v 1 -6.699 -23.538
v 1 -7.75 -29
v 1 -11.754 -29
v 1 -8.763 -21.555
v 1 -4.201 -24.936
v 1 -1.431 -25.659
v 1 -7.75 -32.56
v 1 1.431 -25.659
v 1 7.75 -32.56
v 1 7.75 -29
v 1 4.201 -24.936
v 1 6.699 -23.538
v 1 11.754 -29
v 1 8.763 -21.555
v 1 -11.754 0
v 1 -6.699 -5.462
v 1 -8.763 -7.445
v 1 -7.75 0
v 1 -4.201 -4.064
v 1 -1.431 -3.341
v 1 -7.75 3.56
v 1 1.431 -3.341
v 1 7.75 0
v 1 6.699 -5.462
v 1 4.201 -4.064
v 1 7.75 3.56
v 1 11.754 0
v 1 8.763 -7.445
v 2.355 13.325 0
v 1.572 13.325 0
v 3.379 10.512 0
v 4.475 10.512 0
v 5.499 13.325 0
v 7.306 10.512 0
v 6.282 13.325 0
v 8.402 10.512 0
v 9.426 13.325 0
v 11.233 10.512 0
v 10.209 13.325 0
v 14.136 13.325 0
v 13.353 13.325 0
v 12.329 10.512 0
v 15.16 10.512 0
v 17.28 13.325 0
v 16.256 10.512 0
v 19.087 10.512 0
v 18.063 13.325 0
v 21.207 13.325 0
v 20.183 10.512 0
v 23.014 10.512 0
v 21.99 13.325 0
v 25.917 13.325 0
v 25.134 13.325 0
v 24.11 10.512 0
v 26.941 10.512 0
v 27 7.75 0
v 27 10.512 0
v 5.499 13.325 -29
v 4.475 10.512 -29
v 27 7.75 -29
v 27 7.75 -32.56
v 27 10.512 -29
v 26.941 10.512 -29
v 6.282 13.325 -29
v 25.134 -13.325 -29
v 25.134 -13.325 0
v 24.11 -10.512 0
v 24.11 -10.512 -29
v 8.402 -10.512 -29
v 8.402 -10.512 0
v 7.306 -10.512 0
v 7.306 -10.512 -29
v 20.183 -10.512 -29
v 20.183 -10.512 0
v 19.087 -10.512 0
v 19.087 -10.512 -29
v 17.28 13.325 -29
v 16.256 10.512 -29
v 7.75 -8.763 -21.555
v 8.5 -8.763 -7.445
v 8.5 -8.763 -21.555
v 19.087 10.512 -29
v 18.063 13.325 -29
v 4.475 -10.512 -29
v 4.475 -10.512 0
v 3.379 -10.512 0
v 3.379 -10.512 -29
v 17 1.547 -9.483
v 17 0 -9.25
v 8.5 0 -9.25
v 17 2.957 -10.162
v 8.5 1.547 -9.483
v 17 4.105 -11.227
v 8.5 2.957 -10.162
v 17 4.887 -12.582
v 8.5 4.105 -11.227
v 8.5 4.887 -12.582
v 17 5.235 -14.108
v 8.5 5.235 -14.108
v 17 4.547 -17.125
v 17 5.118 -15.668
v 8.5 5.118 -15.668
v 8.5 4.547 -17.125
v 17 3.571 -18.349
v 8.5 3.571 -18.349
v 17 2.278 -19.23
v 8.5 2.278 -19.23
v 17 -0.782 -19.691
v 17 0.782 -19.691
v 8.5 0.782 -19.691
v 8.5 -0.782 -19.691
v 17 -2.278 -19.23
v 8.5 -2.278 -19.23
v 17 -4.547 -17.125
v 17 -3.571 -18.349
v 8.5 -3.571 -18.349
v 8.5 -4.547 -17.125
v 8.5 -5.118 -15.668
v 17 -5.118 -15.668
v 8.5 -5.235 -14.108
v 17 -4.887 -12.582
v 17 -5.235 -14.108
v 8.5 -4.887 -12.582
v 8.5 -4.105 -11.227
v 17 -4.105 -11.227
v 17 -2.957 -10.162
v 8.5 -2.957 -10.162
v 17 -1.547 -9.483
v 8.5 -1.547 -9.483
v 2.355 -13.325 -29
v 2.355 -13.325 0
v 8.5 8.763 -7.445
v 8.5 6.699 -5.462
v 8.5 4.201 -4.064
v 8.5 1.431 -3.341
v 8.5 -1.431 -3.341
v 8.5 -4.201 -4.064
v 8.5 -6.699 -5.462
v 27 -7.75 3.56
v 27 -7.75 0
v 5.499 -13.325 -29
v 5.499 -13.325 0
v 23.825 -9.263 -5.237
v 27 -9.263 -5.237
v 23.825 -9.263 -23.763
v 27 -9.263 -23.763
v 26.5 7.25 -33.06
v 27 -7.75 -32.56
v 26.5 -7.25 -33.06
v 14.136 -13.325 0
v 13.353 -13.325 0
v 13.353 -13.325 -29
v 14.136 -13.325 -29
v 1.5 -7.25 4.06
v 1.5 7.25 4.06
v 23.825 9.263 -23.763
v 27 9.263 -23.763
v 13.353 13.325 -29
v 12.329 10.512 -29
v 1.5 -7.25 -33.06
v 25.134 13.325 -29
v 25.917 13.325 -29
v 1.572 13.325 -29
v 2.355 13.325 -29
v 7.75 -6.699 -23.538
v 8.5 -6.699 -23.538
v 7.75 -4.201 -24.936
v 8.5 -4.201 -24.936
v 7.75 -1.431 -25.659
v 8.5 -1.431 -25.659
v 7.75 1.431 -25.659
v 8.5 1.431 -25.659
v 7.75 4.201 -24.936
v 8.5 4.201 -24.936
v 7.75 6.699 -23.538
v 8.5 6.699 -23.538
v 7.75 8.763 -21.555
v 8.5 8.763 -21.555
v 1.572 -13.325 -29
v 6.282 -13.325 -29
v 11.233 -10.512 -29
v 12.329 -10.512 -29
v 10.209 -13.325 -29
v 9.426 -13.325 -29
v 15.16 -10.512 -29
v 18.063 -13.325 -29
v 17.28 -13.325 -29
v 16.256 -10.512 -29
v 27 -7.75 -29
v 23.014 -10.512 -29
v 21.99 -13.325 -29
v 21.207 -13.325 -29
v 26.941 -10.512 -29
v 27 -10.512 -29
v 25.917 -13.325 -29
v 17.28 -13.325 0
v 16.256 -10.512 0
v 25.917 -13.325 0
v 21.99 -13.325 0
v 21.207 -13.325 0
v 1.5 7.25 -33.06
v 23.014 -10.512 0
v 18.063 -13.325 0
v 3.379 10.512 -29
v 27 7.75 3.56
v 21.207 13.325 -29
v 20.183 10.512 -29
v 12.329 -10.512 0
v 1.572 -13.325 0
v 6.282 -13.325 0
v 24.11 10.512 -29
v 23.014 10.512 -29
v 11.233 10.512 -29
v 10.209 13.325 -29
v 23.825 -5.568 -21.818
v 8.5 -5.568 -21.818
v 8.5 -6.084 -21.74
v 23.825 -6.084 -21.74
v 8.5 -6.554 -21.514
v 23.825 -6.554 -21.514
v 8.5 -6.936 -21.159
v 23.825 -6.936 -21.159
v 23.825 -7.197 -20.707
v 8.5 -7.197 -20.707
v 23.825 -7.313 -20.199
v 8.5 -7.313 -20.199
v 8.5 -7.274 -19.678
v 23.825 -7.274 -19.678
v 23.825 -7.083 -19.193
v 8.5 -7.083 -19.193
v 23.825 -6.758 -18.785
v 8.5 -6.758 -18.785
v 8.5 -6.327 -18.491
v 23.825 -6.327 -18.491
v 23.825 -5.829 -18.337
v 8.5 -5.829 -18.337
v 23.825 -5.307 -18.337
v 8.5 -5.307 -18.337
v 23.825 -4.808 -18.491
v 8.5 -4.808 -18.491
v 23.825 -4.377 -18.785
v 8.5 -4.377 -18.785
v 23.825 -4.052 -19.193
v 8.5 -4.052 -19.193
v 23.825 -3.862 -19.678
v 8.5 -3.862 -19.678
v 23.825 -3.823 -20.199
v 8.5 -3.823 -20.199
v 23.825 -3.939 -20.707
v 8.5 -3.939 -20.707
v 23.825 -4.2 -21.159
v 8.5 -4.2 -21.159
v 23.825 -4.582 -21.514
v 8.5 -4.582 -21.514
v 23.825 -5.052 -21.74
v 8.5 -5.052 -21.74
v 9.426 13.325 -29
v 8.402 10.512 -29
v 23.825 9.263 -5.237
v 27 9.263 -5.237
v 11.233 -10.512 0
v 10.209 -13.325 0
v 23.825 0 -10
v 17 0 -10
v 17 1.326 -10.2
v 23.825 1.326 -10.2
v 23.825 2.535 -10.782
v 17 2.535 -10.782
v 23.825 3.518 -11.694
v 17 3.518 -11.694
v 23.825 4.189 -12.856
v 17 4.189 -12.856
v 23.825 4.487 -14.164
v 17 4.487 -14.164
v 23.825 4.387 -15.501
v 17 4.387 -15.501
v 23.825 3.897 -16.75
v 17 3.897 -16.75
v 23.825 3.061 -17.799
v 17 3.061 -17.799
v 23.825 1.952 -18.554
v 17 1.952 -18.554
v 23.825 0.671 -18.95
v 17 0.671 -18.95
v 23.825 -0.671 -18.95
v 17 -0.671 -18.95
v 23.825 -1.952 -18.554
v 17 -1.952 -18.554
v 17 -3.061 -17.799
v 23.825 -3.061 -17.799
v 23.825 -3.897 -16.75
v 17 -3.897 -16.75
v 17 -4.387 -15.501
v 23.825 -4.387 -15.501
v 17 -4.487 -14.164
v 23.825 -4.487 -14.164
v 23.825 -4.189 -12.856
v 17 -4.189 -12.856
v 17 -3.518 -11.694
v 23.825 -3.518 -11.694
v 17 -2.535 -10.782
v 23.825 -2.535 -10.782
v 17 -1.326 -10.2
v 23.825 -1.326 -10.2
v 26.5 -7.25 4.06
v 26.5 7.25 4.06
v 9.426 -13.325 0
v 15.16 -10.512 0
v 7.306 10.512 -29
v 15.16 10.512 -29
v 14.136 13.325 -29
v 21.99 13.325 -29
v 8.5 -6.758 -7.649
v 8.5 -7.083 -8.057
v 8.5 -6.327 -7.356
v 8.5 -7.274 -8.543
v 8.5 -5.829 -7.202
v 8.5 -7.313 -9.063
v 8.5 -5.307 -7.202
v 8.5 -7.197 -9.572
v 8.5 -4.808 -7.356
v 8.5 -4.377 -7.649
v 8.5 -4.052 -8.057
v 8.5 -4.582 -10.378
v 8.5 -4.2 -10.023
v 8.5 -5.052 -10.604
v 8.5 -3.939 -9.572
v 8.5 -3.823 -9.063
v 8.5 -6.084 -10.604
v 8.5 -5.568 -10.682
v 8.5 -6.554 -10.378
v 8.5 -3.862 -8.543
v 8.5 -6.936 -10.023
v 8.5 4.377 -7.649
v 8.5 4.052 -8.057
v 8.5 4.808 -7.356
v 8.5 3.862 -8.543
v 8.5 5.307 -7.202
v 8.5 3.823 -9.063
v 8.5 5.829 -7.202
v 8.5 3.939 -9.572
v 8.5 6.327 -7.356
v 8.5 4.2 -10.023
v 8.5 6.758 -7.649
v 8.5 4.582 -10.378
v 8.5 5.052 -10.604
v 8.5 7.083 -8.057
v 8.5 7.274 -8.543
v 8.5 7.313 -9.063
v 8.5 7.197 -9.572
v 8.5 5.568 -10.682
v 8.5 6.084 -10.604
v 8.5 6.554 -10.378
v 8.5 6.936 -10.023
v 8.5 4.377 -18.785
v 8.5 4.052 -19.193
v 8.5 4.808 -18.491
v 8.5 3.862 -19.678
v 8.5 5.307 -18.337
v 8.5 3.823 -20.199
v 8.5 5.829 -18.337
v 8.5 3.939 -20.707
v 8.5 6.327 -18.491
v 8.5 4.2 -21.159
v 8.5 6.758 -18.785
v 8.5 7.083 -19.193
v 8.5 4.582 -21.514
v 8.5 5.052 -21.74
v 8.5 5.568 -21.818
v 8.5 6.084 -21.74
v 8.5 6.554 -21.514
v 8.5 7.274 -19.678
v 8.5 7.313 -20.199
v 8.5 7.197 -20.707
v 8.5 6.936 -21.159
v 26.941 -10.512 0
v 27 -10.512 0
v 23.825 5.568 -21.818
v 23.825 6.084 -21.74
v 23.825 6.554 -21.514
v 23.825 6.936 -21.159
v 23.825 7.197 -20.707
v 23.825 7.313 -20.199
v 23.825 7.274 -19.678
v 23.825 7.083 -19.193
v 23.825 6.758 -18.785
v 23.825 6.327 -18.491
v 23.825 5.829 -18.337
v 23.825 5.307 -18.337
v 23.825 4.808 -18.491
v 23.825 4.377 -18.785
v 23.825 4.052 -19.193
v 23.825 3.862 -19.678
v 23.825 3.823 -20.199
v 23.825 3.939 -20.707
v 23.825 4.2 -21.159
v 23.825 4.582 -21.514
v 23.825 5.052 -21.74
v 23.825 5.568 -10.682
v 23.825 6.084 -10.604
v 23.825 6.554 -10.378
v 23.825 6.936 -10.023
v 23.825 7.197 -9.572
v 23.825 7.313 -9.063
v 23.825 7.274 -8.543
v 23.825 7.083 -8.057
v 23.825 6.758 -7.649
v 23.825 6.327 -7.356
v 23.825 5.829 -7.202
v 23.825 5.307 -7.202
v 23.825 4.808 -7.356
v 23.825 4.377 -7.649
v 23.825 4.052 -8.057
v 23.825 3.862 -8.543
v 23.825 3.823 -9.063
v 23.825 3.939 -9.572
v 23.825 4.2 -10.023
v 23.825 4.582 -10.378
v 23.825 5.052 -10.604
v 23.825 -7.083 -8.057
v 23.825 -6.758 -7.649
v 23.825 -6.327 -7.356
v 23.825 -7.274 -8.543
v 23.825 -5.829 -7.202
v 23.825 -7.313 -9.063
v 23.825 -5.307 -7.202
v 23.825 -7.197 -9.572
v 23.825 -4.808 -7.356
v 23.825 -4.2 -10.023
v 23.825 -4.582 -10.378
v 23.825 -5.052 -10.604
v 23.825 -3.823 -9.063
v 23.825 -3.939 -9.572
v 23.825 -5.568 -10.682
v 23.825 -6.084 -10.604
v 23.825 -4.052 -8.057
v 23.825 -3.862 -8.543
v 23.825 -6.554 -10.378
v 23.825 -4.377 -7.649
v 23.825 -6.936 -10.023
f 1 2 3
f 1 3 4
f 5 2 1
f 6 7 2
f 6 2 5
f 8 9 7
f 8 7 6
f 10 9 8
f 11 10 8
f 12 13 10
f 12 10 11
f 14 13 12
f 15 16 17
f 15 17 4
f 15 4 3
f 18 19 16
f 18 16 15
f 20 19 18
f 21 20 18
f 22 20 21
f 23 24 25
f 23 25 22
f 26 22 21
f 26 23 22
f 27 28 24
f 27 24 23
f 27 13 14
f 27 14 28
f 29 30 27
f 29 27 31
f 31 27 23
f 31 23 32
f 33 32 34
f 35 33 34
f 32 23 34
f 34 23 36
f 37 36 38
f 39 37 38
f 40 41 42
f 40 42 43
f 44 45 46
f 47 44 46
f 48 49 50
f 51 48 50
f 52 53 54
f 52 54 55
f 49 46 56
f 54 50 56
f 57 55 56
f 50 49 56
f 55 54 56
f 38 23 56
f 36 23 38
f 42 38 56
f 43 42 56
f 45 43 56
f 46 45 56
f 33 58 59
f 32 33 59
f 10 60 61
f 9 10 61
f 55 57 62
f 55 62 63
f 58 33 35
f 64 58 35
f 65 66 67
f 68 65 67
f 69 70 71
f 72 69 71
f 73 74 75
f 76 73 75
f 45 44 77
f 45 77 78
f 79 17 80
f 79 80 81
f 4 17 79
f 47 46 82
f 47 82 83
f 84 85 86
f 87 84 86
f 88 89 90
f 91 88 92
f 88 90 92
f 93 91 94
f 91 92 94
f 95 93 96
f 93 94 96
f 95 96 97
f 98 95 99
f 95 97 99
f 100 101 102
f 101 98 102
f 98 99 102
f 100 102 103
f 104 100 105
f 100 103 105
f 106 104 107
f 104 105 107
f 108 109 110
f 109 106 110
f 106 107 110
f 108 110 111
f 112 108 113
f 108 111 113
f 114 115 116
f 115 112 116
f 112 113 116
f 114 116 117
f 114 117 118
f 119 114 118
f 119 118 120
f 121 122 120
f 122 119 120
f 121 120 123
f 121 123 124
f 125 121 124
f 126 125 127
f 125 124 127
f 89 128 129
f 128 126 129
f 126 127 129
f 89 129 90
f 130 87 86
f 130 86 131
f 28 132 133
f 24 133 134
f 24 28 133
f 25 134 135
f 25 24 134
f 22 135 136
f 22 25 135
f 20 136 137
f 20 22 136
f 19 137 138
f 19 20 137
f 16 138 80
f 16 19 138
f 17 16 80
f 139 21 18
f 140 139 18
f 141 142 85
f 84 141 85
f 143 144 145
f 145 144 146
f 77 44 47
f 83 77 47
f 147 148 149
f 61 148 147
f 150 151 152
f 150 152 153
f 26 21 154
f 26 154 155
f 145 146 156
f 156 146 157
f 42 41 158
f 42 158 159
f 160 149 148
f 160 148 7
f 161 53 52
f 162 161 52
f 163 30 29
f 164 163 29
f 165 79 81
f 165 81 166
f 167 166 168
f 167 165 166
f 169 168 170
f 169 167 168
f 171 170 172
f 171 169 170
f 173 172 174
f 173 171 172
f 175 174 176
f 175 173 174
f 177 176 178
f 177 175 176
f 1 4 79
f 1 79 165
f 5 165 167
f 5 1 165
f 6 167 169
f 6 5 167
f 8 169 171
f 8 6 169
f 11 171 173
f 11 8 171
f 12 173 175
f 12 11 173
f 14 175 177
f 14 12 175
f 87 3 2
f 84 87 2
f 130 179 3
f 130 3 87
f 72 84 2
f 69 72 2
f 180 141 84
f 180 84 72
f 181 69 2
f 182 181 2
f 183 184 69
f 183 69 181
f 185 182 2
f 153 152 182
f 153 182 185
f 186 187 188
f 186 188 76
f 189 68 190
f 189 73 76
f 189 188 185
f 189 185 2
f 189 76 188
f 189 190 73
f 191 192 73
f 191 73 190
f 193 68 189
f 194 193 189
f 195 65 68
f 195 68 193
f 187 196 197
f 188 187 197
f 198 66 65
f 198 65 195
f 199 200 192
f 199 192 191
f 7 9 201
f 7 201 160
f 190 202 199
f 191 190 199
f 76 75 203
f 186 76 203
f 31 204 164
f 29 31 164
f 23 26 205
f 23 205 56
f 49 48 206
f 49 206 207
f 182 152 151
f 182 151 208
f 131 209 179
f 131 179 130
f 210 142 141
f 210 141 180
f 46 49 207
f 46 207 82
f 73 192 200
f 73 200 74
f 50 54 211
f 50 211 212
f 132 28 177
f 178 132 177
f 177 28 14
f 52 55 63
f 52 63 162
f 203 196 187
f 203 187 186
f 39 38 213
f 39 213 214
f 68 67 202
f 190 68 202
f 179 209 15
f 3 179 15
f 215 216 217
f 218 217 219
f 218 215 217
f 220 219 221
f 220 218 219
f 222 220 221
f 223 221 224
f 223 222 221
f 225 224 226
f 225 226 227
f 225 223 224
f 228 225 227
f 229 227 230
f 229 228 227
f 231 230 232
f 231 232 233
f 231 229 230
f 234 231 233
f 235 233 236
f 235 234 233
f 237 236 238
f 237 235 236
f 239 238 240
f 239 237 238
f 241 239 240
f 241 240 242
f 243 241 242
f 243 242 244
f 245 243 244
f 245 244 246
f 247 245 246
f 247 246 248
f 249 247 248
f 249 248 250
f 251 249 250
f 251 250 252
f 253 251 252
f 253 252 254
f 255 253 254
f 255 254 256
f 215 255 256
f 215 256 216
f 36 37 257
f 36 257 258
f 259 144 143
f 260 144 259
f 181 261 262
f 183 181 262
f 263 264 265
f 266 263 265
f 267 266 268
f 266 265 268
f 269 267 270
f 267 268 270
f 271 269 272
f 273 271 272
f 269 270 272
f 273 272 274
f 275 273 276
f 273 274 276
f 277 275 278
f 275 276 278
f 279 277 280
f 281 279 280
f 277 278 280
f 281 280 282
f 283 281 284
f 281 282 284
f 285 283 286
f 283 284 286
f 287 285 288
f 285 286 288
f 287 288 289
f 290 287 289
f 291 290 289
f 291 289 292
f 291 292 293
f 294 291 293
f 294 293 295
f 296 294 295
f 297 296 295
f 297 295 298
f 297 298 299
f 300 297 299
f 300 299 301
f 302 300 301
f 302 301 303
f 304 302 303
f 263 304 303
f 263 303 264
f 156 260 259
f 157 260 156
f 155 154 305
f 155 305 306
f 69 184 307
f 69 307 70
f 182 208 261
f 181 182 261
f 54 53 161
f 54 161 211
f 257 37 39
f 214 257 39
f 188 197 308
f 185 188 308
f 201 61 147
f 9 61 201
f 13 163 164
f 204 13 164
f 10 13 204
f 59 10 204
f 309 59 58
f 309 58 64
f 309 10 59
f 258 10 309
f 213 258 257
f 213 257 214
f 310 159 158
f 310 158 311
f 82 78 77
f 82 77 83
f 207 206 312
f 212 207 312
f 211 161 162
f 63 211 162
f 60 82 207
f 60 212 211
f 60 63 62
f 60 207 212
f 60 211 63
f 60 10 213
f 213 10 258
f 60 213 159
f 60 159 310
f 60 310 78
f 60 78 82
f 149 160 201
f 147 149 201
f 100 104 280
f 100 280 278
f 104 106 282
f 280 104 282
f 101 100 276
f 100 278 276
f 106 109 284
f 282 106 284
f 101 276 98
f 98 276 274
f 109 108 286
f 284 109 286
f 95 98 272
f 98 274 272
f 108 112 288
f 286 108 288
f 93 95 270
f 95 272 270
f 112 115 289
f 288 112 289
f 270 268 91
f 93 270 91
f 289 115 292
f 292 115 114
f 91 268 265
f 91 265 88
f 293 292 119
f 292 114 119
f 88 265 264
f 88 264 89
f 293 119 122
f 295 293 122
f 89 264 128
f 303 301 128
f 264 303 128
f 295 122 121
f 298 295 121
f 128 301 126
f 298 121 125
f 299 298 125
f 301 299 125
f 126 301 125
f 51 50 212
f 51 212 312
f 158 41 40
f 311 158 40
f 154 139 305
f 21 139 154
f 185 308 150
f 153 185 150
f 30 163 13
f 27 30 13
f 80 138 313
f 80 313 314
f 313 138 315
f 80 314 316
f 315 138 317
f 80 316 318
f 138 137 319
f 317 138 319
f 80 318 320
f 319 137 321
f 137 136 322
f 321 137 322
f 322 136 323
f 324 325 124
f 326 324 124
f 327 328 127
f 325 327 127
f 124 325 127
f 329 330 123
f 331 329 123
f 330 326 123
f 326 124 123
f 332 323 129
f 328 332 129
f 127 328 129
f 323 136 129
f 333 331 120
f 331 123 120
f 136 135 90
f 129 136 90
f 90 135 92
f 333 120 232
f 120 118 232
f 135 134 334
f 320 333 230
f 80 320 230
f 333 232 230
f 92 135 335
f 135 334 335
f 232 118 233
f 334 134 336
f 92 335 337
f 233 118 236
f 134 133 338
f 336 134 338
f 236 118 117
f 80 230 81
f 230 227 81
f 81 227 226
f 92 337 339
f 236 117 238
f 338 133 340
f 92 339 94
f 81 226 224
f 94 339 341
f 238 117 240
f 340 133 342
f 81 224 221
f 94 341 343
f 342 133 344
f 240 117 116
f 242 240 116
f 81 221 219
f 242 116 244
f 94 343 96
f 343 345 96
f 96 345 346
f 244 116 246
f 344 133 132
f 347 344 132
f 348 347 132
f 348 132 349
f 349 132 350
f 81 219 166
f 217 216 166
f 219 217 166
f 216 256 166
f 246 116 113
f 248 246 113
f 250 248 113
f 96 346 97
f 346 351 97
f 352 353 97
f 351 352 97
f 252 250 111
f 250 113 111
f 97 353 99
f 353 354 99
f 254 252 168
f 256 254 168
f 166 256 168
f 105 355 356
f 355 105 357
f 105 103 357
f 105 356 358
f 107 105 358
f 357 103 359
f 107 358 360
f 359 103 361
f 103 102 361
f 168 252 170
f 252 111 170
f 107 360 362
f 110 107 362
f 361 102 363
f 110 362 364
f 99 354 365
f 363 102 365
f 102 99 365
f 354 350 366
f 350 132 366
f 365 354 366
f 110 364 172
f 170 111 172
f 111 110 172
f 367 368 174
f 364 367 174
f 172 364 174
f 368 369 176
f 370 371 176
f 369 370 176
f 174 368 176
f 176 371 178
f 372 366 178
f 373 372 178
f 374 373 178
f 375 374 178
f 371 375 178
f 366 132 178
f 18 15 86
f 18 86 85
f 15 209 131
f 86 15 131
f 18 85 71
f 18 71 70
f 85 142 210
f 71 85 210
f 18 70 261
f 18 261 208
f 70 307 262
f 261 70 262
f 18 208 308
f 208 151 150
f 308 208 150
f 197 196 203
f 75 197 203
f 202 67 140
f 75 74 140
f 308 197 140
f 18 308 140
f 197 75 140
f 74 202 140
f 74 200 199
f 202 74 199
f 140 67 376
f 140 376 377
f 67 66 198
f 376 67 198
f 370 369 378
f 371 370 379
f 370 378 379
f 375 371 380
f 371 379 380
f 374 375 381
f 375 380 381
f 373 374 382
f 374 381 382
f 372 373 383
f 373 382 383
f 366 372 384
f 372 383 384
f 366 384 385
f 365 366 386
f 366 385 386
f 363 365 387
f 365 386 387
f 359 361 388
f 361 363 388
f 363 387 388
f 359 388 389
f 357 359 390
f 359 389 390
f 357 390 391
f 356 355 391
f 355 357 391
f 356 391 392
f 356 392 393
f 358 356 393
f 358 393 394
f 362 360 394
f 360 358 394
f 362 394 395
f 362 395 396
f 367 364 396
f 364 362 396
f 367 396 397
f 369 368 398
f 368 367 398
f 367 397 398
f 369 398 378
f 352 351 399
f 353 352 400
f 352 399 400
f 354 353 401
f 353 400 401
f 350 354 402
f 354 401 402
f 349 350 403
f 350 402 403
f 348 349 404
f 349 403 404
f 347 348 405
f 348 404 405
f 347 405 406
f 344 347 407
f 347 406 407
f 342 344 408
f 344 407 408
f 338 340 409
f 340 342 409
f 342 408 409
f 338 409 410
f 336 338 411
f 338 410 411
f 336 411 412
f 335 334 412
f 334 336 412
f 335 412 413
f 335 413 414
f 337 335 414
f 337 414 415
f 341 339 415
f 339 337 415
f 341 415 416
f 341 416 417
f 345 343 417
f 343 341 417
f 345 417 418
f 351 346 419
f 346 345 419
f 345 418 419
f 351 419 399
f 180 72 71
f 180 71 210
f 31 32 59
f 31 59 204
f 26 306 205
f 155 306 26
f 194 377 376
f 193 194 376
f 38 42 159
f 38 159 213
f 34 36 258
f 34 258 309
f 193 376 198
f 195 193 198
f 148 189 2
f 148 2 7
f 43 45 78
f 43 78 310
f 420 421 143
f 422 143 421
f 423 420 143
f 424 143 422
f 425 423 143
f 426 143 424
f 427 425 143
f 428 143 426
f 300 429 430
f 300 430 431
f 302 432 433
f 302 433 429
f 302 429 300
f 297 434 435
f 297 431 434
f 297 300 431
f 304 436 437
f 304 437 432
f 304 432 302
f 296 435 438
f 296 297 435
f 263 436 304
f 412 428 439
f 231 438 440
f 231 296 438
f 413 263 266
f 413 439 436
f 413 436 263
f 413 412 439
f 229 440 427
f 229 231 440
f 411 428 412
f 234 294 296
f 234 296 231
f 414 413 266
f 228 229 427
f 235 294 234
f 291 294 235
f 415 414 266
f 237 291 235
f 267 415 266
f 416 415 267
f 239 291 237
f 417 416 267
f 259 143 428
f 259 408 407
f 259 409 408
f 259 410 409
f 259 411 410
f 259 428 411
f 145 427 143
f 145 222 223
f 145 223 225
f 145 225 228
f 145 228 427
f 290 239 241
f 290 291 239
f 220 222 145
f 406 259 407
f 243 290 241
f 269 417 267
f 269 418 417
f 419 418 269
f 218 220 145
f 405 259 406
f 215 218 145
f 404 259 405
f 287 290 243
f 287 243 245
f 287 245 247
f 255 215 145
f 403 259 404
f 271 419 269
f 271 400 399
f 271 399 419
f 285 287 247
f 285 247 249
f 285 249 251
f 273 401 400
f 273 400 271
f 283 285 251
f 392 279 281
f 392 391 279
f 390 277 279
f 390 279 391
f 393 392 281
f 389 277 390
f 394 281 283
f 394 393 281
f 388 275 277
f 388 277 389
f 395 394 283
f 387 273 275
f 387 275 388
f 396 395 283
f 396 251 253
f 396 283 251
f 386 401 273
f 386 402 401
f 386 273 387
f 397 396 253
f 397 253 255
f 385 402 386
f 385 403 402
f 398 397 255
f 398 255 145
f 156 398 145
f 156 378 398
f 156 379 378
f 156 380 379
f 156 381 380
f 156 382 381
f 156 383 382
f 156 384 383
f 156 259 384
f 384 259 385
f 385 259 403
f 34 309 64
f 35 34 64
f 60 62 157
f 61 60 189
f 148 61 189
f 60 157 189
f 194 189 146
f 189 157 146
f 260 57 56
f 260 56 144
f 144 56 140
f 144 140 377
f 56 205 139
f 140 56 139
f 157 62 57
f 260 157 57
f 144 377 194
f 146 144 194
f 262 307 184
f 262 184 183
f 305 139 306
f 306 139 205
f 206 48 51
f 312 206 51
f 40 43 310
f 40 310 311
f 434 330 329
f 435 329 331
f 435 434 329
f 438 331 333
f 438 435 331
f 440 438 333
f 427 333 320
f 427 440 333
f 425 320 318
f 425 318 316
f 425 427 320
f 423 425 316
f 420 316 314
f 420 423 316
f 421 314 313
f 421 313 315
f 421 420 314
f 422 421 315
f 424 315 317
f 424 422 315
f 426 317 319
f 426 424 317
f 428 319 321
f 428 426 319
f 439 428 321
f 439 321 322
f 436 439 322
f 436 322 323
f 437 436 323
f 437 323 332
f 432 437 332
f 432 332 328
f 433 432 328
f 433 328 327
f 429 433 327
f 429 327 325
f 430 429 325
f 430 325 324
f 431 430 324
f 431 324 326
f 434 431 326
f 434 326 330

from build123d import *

# Parameters (mm, degrees)
BLANKSKE_W           = 27
BLANKSKE_H           = 13.325
BLANK_DEPTH          = 29
TOOTHCUTSIM_DEPTH    = 42.803775248
TEETHCUTS_COUNT      = 8
TEETHCUTS_PITCH      = 3.926990813
CUT_EXTRUDE1_DEPTH   = 6.75
SKETCH3_R            = 5.25
CUT_EXTRUDE2_DEPTH   = 10.25
SKETCH4_R            = 4.5
CUT_EXTRUDE3_DEPTH   = 37.16013862
SKETCH5_R            = 2.5
CUT_EXTRUDE4_DEPTH   = 3.175
SKETCH6_R            = 1.75
CUT_EXTRUDE5_DEPTH   = 40.826953813
MIRROR1_COPY_1_DEPTH = 42.803775248
MIRROR1_COPY_2_DEPTH = 42.803775248
MIRROR1_COPY_3_DEPTH = 42.803775248
MIRROR1_COPY_4_DEPTH = 42.803775248
MIRROR1_COPY_5_DEPTH = 42.803775248
MIRROR1_COPY_6_DEPTH = 42.803775248
MIRROR1_COPY_7_DEPTH = 42.803775248
SKETCH9_W            = 18.526
SKETCH9_H            = 18.526
CUT_EXTRUDE6_DEPTH   = 3.175
SKETCH10_W           = 4.06
SKETCH10_H           = 15.5
BOSS_EXTRUDE2_DEPTH  = 27
SKETCH12_W           = 29
SKETCH12_H           = 6.213309413
SKETCH12_H_2         = 5.066323004
CUT_EXTRUDE7_DEPTH   = 1
SKETCH12_10_R        = 5.25
SKETCH12_10_R_2      = 1.75
CUT_EXTRUDE8_DEPTH   = 7.75
CUT_EXTRUDE9_START   = -7.75
SKETCH12_11_R        = 5.25
SKETCH12_11_R_2      = 1.75
CUT_EXTRUDE9_DEPTH   = 0.75
CHAMFER1_SIZE        = 0.5


with BuildPart() as part:
    # BlankSke → Blank (new body)
    with BuildSketch(Plane.XY):
        with Locations((13.5, 6.6625)):
            Rectangle(BLANKSKE_W, BLANKSKE_H)
    blank = extrude(amount=-BLANK_DEPTH)

    # TooCutSkeSim → ToothCutSim (cut, through all)
    with BuildSketch(Plane.XY):
        Polygon((0.548044212, 10.5125), (-0.548044212, 10.5125), (-1.58095534, 13.3504), (1.58095534, 13.3504), align=None)
    toothcutsim = extrude(amount=-TOOTHCUTSIM_DEPTH, mode=Mode.SUBTRACT)

    # TeethCuts: ToothCutSim ×8
    with Locations(*[(i * TEETHCUTS_PITCH, 0, 0) for i in range(1, TEETHCUTS_COUNT)]):
        add(toothcutsim, mode=Mode.SUBTRACT)

    # Sketch2 → Cut-Extrude1 (cut)
    with BuildSketch(Plane.ZY):
        with BuildLine():
            Line((-7.445049185, 8.763), (-21.554950815, 8.763))
            ThreePointArc((-21.554950815, 8.763), (-24.647184256, 4.857689952), (-25.75, 0))
            Line((-25.75, 0), (-3.25, 0))
            ThreePointArc((-3.25, 0), (-4.352815744, 4.857689952), (-7.445049185, 8.763))
        make_face()
    cut_extrude1 = extrude(amount=-CUT_EXTRUDE1_DEPTH, mode=Mode.SUBTRACT)

    # Sketch3 → Cut-Extrude2 (cut)
    with BuildSketch(Plane.ZY.offset(-6.75)):
        with Locations((-14.5, 0)):
            Circle(SKETCH3_R)
    cut_extrude2 = extrude(amount=-CUT_EXTRUDE2_DEPTH, mode=Mode.SUBTRACT)

    # Sketch4 → Cut-Extrude3 (cut, symmetric)
    with BuildSketch(Plane.ZY.offset(-17)):
        with Locations((-14.5, 0)):
            Circle(SKETCH4_R)
    cut_extrude3 = extrude(amount=CUT_EXTRUDE3_DEPTH, both=True, mode=Mode.SUBTRACT)

    # Sketch5 → Cut-Extrude4 (cut)
    with BuildSketch(Plane(origin=(27, 0, 0), x_dir=(0, 0, -1), z_dir=(1, 0, 0))):
        with Locations((8.932241205, 5.567758795)):
            Circle(SKETCH5_R)
        with Locations((20.067758795, 5.567758795)):
            Circle(SKETCH5_R)
    cut_extrude4 = extrude(amount=-CUT_EXTRUDE4_DEPTH, mode=Mode.SUBTRACT)

    # Sketch6 → Cut-Extrude5 (cut, through all)
    with BuildSketch(Plane(origin=(23.825, 0, 0), x_dir=(0, 0, -1), z_dir=(1, 0, 0))):
        with Locations((20.067758795, 5.567758795)):
            Circle(SKETCH6_R)
        with Locations((8.932241205, 5.567758795)):
            Circle(SKETCH6_R)
    cut_extrude5 = extrude(amount=-CUT_EXTRUDE5_DEPTH, mode=Mode.SUBTRACT)

    # Mirror1: Blank, ToothCutSim, Cut-Extrude1, Cut-Extrude2, Cut-Extrude3, Cut-Extrude4, Cut-Extrude5 across plane
    add(blank.mirror(Plane(origin=(0, 0, -29), x_dir=(0, 0, 1), z_dir=(0, -1, 0))))
    add(toothcutsim.mirror(Plane(origin=(0, 0, -29), x_dir=(0, 0, 1), z_dir=(0, -1, 0))), mode=Mode.SUBTRACT)
    add(cut_extrude1.mirror(Plane(origin=(0, 0, -29), x_dir=(0, 0, 1), z_dir=(0, -1, 0))), mode=Mode.SUBTRACT)
    add(cut_extrude2.mirror(Plane(origin=(0, 0, -29), x_dir=(0, 0, 1), z_dir=(0, -1, 0))), mode=Mode.SUBTRACT)
    add(cut_extrude3.mirror(Plane(origin=(0, 0, -29), x_dir=(0, 0, 1), z_dir=(0, -1, 0))), mode=Mode.SUBTRACT)
    add(cut_extrude4.mirror(Plane(origin=(0, 0, -29), x_dir=(0, 0, 1), z_dir=(0, -1, 0))), mode=Mode.SUBTRACT)
    add(cut_extrude5.mirror(Plane(origin=(0, 0, -29), x_dir=(0, 0, 1), z_dir=(0, -1, 0))), mode=Mode.SUBTRACT)

    # Mirror1 copy 1 sketch → Mirror1 copy 1 (cut, through all)
    with BuildSketch(Plane(origin=(3.926990813, 0, 0), x_dir=(1, 0, 0), z_dir=(0, 0, 1))):
        Polygon((0.548044212, -10.5125), (-0.548044212, -10.5125), (-1.58095534, -13.3504), (1.58095534, -13.3504), align=None)
    extrude(amount=-MIRROR1_COPY_1_DEPTH, mode=Mode.SUBTRACT)

    # Mirror1 copy 2 sketch → Mirror1 copy 2 (cut, through all)
    with BuildSketch(Plane(origin=(7.853981625, 0, 0), x_dir=(1, 0, 0), z_dir=(0, 0, 1))):
        Polygon((0.548044212, -10.5125), (-0.548044212, -10.5125), (-1.58095534, -13.3504), (1.58095534, -13.3504), align=None)
    extrude(amount=-MIRROR1_COPY_2_DEPTH, mode=Mode.SUBTRACT)

    # Mirror1 copy 3 sketch → Mirror1 copy 3 (cut, through all)
    with BuildSketch(Plane(origin=(11.780972438, 0, 0), x_dir=(1, 0, 0), z_dir=(0, 0, 1))):
        Polygon((0.548044212, -10.5125), (-0.548044212, -10.5125), (-1.58095534, -13.3504), (1.58095534, -13.3504), align=None)
    extrude(amount=-MIRROR1_COPY_3_DEPTH, mode=Mode.SUBTRACT)

    # Mirror1 copy 4 sketch → Mirror1 copy 4 (cut, through all)
    with BuildSketch(Plane(origin=(15.70796325, 0, 0), x_dir=(1, 0, 0), z_dir=(0, 0, 1))):
        Polygon((0.548044212, -10.5125), (-0.548044212, -10.5125), (-1.58095534, -13.3504), (1.58095534, -13.3504), align=None)
    extrude(amount=-MIRROR1_COPY_4_DEPTH, mode=Mode.SUBTRACT)

    # Mirror1 copy 5 sketch → Mirror1 copy 5 (cut, through all)
    with BuildSketch(Plane(origin=(19.634954063, 0, 0), x_dir=(1, 0, 0), z_dir=(0, 0, 1))):
        Polygon((0.548044212, -10.5125), (-0.548044212, -10.5125), (-1.58095534, -13.3504), (1.58095534, -13.3504), align=None)
    extrude(amount=-MIRROR1_COPY_5_DEPTH, mode=Mode.SUBTRACT)

    # Mirror1 copy 6 sketch → Mirror1 copy 6 (cut, through all)
    with BuildSketch(Plane(origin=(23.561944875, 0, 0), x_dir=(1, 0, 0), z_dir=(0, 0, 1))):
        Polygon((0.548044212, -10.5125), (-0.548044212, -10.5125), (-1.58095534, -13.3504), (1.58095534, -13.3504), align=None)
    extrude(amount=-MIRROR1_COPY_6_DEPTH, mode=Mode.SUBTRACT)

    # Mirror1 copy 7 sketch → Mirror1 copy 7 (cut, through all)
    with BuildSketch(Plane(origin=(27.488935688, 0, 0), x_dir=(1, 0, 0), z_dir=(0, 0, 1))):
        Polygon((0.548044212, -10.5125), (-0.548044212, -10.5125), (-1.58095534, -13.3504), (1.58095534, -13.3504), align=None)
    extrude(amount=-MIRROR1_COPY_7_DEPTH, mode=Mode.SUBTRACT)

    # Sketch9 → Cut-Extrude6 (cut)
    with BuildSketch(Plane(origin=(27, 0, 0), x_dir=(0, 0, -1), z_dir=(1, 0, 0))):
        with Locations((14.5, 0)):
            Rectangle(SKETCH9_W, SKETCH9_H)
    extrude(amount=-CUT_EXTRUDE6_DEPTH, mode=Mode.SUBTRACT)

    # Sketch10 → Boss-Extrude2 (add, through all)
    with BuildSketch(Plane(origin=(27, 0, 0), x_dir=(0, 0, -1), z_dir=(1, 0, 0))):
        with Locations((31.03, 0)):
            Rectangle(SKETCH10_W, SKETCH10_H)
        with Locations((-2.03, 0)):
            Rectangle(SKETCH10_W, SKETCH10_H)
    extrude(amount=-BOSS_EXTRUDE2_DEPTH)

    # Sketch12 → Cut-Extrude7 (cut)
    with BuildSketch(Plane.ZY):
        with Locations((-14.5, 13.619154707)):
            Rectangle(SKETCH12_W, SKETCH12_H)
        Polygon((0, 10.5125), (-29, 10.5125), (-29, 7.75), (-33.06, 7.75), (-33.06, -7.75), (-29, -7.75), (-29, -10.5125), (0, -10.5125), (0, -7.75), (4.06, -7.75), (4.06, 7.75), (0, 7.75), align=None)
        with BuildLine():
            Line((-21.554950815, 8.763), (-7.445049185, 8.763))
            ThreePointArc((-7.445049185, 8.763), (-3.25, 0), (-7.445049185, -8.763))
            Line((-7.445049185, -8.763), (-21.554950815, -8.763))
            ThreePointArc((-21.554950815, -8.763), (-25.75, 0), (-21.554950815, 8.763))
        make_face(mode=Mode.SUBTRACT)
        with Locations((-14.5, -13.045661502)):
            Rectangle(SKETCH12_W, SKETCH12_H_2)
    extrude(amount=-CUT_EXTRUDE7_DEPTH, mode=Mode.SUBTRACT)

    # Sketch12<10> → Cut-Extrude8 (cut)
    with BuildSketch(Plane.ZY):
        with BuildLine():
            ThreePointArc((-7.445049185, 8.763), (-3.25, 0), (-7.445049185, -8.763))
            Line((-7.445049185, -8.763), (-21.554950815, -8.763))
            ThreePointArc((-21.554950815, -8.763), (-25.75, 0), (-21.554950815, 8.763))
            Line((-21.554950815, 8.763), (-7.445049185, 8.763))
        make_face()
        with Locations((-14.5, 0)):
            Circle(SKETCH12_10_R, mode=Mode.SUBTRACT)
        with Locations(Location((-20.067758795, -5.567758795, 0), (0, 0, 180))):
            Circle(SKETCH12_10_R_2, mode=Mode.SUBTRACT)
        with Locations(Location((-8.932241205, -5.567758795, 0), (0, 0, 180))):
            Circle(SKETCH12_10_R_2, mode=Mode.SUBTRACT)
        with Locations(Location((-8.932241205, 5.567758795, 0), (0, 0, 180))):
            Circle(SKETCH12_10_R_2, mode=Mode.SUBTRACT)
        with Locations(Location((-20.067758795, 5.567758795, 0), (0, 0, 180))):
            Circle(SKETCH12_10_R_2, mode=Mode.SUBTRACT)
    extrude(amount=-CUT_EXTRUDE8_DEPTH, mode=Mode.SUBTRACT)

    # Sketch12<11> → Cut-Extrude9 (cut)
    with BuildSketch(Plane.ZY.offset(CUT_EXTRUDE9_START)):
        with BuildLine():
            ThreePointArc((-7.445049185, 8.763), (-3.25, 0), (-7.445049185, -8.763))
            Line((-7.445049185, -8.763), (-21.554950815, -8.763))
            ThreePointArc((-21.554950815, -8.763), (-25.75, 0), (-21.554950815, 8.763))
            Line((-21.554950815, 8.763), (-7.445049185, 8.763))
        make_face()
        with Locations((-14.5, 0)):
            Circle(SKETCH12_11_R, mode=Mode.SUBTRACT)
        with Locations(Location((-20.067758795, -5.567758795, 0), (0, 0, 180))):
            Circle(SKETCH12_11_R_2, mode=Mode.SUBTRACT)
        with Locations(Location((-8.932241205, -5.567758795, 0), (0, 0, 180))):
            Circle(SKETCH12_11_R_2, mode=Mode.SUBTRACT)
        with Locations(Location((-8.932241205, 5.567758795, 0), (0, 0, 180))):
            Circle(SKETCH12_11_R_2, mode=Mode.SUBTRACT)
        with Locations(Location((-20.067758795, 5.567758795, 0), (0, 0, 180))):
            Circle(SKETCH12_11_R_2, mode=Mode.SUBTRACT)
    extrude(amount=-CUT_EXTRUDE9_DEPTH, mode=Mode.SUBTRACT)

    # Chamfer1
    chamfer1_edges = [part.edges().sort_by_distance(p)[0] for p in [
        (27, 0, -33.06),
        (27, 0, 4.06),
        (14, 7.75, 4.06),
        (14, -7.75, 4.06),
        (14, -7.75, -33.06),
        (14, 7.75, -33.06),
        (1, 0, -33.06),
        (1, 0, 4.06),
    ]]
    chamfer(chamfer1_edges, length=CHAMFER1_SIZE)


solid = part.part
